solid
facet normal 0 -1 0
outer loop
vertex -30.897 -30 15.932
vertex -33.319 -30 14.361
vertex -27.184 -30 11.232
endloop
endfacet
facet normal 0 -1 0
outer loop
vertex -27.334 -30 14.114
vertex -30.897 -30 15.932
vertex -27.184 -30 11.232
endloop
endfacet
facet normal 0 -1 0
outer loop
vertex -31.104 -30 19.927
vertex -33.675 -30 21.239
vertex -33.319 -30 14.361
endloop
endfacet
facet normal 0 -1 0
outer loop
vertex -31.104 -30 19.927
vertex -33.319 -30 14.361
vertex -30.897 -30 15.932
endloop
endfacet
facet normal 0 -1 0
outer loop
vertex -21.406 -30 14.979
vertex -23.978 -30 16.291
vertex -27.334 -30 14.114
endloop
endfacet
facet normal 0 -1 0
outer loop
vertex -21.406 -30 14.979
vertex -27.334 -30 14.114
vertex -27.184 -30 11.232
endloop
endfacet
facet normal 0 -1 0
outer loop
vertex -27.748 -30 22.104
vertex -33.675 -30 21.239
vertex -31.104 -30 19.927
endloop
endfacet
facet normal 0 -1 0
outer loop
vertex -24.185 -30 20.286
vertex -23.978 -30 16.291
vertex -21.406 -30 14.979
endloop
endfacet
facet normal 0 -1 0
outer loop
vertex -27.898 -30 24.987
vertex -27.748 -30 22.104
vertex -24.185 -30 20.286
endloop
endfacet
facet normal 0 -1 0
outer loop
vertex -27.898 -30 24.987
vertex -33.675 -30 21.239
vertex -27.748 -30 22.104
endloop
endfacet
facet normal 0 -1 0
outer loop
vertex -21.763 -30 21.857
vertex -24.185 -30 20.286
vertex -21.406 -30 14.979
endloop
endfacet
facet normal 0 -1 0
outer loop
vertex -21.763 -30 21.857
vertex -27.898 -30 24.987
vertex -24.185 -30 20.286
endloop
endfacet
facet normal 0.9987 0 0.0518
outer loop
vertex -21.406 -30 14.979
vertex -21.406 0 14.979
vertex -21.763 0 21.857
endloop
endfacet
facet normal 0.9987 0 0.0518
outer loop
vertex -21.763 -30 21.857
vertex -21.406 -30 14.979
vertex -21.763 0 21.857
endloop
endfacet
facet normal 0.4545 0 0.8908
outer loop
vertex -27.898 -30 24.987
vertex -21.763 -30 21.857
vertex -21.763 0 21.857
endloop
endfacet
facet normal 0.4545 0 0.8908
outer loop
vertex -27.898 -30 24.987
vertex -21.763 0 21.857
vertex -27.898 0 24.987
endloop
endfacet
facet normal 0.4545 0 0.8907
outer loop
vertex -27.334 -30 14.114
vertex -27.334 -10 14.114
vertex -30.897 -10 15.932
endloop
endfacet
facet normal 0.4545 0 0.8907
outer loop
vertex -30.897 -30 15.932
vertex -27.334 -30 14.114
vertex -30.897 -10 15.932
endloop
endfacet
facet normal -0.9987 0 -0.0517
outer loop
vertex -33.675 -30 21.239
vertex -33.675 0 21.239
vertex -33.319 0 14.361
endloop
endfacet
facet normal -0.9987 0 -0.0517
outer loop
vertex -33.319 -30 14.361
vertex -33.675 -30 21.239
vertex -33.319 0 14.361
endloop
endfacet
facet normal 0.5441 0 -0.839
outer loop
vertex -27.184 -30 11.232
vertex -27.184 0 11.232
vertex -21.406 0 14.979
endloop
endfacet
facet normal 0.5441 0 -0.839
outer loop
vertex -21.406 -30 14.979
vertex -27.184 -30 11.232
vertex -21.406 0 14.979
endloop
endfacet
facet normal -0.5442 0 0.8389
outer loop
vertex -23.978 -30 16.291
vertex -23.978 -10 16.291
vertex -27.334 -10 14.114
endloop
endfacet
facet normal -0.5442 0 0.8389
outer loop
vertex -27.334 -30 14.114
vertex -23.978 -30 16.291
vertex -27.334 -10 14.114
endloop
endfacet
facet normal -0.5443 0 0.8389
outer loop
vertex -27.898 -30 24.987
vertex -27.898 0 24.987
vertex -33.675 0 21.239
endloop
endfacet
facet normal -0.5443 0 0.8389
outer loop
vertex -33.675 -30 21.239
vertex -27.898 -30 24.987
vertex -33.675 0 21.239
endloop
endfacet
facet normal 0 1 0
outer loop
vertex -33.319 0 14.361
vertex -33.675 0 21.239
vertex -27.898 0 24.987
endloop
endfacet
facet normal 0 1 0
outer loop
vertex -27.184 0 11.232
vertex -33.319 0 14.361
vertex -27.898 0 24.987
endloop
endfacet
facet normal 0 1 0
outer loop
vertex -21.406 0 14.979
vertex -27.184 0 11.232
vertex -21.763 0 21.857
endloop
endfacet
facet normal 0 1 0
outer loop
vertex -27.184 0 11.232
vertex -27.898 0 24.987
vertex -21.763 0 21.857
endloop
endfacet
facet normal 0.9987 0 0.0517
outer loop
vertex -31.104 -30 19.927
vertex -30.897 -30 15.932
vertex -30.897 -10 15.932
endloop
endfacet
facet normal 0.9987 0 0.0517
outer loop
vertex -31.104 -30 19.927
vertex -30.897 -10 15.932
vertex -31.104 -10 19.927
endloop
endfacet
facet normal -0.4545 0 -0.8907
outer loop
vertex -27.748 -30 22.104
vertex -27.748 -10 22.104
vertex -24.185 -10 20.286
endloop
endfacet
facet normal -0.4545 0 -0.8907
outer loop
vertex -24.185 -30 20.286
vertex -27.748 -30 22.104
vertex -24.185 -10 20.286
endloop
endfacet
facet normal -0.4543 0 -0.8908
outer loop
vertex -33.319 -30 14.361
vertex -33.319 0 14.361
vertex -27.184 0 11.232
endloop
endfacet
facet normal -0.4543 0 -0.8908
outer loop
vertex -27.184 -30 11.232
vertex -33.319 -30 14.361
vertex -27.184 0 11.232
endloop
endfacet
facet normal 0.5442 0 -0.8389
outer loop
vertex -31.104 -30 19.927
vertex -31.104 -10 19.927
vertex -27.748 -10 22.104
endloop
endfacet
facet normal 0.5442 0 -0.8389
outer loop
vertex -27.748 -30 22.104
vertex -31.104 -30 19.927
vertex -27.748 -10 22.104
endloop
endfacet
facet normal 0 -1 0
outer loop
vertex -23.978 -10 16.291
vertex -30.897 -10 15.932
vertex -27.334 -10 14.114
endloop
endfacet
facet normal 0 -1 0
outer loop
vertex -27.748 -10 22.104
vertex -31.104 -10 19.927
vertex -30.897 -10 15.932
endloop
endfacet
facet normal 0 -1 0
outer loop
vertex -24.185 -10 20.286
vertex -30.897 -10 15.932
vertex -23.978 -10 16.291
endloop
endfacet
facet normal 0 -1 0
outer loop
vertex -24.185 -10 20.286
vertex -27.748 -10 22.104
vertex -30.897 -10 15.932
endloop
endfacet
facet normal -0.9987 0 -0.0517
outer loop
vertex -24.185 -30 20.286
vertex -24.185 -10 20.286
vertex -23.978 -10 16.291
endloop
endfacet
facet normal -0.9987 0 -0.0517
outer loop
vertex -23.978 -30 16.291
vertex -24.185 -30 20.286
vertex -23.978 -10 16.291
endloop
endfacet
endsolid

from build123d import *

# Parameters (mm, degrees)
F1_DEPTH = 30
F2_DEPTH = 10


with BuildPart() as f1:
    # F0 (on Front) → F1 (new body)
    with BuildSketch(Plane.XZ):
        Polygon((-27.897622, 24.986569), (-33.67534, 21.23886), (-33.318587, 14.361355), (-27.184117, 11.23156), (-21.406399, 14.979269), (-21.763152, 21.856774), align=None)
        Polygon((-24.185025, 20.285829), (-23.977814, 16.2912), (-27.333658, 14.114435), (-30.896714, 15.9323), (-31.103926, 19.926929), (-27.748081, 22.103694), align=None, mode=Mode.SUBTRACT)
    extrude(amount=F1_DEPTH)

    # F0 (on Front) → F2 (join)
    with BuildSketch(Plane.XZ):
        Polygon((-27.333658, 14.114435), (-23.977814, 16.2912), (-24.185025, 20.285829), (-27.748081, 22.103694), (-31.103926, 19.926929), (-30.896714, 15.9323), align=None)
    extrude(amount=F2_DEPTH)


solid = f1.part
